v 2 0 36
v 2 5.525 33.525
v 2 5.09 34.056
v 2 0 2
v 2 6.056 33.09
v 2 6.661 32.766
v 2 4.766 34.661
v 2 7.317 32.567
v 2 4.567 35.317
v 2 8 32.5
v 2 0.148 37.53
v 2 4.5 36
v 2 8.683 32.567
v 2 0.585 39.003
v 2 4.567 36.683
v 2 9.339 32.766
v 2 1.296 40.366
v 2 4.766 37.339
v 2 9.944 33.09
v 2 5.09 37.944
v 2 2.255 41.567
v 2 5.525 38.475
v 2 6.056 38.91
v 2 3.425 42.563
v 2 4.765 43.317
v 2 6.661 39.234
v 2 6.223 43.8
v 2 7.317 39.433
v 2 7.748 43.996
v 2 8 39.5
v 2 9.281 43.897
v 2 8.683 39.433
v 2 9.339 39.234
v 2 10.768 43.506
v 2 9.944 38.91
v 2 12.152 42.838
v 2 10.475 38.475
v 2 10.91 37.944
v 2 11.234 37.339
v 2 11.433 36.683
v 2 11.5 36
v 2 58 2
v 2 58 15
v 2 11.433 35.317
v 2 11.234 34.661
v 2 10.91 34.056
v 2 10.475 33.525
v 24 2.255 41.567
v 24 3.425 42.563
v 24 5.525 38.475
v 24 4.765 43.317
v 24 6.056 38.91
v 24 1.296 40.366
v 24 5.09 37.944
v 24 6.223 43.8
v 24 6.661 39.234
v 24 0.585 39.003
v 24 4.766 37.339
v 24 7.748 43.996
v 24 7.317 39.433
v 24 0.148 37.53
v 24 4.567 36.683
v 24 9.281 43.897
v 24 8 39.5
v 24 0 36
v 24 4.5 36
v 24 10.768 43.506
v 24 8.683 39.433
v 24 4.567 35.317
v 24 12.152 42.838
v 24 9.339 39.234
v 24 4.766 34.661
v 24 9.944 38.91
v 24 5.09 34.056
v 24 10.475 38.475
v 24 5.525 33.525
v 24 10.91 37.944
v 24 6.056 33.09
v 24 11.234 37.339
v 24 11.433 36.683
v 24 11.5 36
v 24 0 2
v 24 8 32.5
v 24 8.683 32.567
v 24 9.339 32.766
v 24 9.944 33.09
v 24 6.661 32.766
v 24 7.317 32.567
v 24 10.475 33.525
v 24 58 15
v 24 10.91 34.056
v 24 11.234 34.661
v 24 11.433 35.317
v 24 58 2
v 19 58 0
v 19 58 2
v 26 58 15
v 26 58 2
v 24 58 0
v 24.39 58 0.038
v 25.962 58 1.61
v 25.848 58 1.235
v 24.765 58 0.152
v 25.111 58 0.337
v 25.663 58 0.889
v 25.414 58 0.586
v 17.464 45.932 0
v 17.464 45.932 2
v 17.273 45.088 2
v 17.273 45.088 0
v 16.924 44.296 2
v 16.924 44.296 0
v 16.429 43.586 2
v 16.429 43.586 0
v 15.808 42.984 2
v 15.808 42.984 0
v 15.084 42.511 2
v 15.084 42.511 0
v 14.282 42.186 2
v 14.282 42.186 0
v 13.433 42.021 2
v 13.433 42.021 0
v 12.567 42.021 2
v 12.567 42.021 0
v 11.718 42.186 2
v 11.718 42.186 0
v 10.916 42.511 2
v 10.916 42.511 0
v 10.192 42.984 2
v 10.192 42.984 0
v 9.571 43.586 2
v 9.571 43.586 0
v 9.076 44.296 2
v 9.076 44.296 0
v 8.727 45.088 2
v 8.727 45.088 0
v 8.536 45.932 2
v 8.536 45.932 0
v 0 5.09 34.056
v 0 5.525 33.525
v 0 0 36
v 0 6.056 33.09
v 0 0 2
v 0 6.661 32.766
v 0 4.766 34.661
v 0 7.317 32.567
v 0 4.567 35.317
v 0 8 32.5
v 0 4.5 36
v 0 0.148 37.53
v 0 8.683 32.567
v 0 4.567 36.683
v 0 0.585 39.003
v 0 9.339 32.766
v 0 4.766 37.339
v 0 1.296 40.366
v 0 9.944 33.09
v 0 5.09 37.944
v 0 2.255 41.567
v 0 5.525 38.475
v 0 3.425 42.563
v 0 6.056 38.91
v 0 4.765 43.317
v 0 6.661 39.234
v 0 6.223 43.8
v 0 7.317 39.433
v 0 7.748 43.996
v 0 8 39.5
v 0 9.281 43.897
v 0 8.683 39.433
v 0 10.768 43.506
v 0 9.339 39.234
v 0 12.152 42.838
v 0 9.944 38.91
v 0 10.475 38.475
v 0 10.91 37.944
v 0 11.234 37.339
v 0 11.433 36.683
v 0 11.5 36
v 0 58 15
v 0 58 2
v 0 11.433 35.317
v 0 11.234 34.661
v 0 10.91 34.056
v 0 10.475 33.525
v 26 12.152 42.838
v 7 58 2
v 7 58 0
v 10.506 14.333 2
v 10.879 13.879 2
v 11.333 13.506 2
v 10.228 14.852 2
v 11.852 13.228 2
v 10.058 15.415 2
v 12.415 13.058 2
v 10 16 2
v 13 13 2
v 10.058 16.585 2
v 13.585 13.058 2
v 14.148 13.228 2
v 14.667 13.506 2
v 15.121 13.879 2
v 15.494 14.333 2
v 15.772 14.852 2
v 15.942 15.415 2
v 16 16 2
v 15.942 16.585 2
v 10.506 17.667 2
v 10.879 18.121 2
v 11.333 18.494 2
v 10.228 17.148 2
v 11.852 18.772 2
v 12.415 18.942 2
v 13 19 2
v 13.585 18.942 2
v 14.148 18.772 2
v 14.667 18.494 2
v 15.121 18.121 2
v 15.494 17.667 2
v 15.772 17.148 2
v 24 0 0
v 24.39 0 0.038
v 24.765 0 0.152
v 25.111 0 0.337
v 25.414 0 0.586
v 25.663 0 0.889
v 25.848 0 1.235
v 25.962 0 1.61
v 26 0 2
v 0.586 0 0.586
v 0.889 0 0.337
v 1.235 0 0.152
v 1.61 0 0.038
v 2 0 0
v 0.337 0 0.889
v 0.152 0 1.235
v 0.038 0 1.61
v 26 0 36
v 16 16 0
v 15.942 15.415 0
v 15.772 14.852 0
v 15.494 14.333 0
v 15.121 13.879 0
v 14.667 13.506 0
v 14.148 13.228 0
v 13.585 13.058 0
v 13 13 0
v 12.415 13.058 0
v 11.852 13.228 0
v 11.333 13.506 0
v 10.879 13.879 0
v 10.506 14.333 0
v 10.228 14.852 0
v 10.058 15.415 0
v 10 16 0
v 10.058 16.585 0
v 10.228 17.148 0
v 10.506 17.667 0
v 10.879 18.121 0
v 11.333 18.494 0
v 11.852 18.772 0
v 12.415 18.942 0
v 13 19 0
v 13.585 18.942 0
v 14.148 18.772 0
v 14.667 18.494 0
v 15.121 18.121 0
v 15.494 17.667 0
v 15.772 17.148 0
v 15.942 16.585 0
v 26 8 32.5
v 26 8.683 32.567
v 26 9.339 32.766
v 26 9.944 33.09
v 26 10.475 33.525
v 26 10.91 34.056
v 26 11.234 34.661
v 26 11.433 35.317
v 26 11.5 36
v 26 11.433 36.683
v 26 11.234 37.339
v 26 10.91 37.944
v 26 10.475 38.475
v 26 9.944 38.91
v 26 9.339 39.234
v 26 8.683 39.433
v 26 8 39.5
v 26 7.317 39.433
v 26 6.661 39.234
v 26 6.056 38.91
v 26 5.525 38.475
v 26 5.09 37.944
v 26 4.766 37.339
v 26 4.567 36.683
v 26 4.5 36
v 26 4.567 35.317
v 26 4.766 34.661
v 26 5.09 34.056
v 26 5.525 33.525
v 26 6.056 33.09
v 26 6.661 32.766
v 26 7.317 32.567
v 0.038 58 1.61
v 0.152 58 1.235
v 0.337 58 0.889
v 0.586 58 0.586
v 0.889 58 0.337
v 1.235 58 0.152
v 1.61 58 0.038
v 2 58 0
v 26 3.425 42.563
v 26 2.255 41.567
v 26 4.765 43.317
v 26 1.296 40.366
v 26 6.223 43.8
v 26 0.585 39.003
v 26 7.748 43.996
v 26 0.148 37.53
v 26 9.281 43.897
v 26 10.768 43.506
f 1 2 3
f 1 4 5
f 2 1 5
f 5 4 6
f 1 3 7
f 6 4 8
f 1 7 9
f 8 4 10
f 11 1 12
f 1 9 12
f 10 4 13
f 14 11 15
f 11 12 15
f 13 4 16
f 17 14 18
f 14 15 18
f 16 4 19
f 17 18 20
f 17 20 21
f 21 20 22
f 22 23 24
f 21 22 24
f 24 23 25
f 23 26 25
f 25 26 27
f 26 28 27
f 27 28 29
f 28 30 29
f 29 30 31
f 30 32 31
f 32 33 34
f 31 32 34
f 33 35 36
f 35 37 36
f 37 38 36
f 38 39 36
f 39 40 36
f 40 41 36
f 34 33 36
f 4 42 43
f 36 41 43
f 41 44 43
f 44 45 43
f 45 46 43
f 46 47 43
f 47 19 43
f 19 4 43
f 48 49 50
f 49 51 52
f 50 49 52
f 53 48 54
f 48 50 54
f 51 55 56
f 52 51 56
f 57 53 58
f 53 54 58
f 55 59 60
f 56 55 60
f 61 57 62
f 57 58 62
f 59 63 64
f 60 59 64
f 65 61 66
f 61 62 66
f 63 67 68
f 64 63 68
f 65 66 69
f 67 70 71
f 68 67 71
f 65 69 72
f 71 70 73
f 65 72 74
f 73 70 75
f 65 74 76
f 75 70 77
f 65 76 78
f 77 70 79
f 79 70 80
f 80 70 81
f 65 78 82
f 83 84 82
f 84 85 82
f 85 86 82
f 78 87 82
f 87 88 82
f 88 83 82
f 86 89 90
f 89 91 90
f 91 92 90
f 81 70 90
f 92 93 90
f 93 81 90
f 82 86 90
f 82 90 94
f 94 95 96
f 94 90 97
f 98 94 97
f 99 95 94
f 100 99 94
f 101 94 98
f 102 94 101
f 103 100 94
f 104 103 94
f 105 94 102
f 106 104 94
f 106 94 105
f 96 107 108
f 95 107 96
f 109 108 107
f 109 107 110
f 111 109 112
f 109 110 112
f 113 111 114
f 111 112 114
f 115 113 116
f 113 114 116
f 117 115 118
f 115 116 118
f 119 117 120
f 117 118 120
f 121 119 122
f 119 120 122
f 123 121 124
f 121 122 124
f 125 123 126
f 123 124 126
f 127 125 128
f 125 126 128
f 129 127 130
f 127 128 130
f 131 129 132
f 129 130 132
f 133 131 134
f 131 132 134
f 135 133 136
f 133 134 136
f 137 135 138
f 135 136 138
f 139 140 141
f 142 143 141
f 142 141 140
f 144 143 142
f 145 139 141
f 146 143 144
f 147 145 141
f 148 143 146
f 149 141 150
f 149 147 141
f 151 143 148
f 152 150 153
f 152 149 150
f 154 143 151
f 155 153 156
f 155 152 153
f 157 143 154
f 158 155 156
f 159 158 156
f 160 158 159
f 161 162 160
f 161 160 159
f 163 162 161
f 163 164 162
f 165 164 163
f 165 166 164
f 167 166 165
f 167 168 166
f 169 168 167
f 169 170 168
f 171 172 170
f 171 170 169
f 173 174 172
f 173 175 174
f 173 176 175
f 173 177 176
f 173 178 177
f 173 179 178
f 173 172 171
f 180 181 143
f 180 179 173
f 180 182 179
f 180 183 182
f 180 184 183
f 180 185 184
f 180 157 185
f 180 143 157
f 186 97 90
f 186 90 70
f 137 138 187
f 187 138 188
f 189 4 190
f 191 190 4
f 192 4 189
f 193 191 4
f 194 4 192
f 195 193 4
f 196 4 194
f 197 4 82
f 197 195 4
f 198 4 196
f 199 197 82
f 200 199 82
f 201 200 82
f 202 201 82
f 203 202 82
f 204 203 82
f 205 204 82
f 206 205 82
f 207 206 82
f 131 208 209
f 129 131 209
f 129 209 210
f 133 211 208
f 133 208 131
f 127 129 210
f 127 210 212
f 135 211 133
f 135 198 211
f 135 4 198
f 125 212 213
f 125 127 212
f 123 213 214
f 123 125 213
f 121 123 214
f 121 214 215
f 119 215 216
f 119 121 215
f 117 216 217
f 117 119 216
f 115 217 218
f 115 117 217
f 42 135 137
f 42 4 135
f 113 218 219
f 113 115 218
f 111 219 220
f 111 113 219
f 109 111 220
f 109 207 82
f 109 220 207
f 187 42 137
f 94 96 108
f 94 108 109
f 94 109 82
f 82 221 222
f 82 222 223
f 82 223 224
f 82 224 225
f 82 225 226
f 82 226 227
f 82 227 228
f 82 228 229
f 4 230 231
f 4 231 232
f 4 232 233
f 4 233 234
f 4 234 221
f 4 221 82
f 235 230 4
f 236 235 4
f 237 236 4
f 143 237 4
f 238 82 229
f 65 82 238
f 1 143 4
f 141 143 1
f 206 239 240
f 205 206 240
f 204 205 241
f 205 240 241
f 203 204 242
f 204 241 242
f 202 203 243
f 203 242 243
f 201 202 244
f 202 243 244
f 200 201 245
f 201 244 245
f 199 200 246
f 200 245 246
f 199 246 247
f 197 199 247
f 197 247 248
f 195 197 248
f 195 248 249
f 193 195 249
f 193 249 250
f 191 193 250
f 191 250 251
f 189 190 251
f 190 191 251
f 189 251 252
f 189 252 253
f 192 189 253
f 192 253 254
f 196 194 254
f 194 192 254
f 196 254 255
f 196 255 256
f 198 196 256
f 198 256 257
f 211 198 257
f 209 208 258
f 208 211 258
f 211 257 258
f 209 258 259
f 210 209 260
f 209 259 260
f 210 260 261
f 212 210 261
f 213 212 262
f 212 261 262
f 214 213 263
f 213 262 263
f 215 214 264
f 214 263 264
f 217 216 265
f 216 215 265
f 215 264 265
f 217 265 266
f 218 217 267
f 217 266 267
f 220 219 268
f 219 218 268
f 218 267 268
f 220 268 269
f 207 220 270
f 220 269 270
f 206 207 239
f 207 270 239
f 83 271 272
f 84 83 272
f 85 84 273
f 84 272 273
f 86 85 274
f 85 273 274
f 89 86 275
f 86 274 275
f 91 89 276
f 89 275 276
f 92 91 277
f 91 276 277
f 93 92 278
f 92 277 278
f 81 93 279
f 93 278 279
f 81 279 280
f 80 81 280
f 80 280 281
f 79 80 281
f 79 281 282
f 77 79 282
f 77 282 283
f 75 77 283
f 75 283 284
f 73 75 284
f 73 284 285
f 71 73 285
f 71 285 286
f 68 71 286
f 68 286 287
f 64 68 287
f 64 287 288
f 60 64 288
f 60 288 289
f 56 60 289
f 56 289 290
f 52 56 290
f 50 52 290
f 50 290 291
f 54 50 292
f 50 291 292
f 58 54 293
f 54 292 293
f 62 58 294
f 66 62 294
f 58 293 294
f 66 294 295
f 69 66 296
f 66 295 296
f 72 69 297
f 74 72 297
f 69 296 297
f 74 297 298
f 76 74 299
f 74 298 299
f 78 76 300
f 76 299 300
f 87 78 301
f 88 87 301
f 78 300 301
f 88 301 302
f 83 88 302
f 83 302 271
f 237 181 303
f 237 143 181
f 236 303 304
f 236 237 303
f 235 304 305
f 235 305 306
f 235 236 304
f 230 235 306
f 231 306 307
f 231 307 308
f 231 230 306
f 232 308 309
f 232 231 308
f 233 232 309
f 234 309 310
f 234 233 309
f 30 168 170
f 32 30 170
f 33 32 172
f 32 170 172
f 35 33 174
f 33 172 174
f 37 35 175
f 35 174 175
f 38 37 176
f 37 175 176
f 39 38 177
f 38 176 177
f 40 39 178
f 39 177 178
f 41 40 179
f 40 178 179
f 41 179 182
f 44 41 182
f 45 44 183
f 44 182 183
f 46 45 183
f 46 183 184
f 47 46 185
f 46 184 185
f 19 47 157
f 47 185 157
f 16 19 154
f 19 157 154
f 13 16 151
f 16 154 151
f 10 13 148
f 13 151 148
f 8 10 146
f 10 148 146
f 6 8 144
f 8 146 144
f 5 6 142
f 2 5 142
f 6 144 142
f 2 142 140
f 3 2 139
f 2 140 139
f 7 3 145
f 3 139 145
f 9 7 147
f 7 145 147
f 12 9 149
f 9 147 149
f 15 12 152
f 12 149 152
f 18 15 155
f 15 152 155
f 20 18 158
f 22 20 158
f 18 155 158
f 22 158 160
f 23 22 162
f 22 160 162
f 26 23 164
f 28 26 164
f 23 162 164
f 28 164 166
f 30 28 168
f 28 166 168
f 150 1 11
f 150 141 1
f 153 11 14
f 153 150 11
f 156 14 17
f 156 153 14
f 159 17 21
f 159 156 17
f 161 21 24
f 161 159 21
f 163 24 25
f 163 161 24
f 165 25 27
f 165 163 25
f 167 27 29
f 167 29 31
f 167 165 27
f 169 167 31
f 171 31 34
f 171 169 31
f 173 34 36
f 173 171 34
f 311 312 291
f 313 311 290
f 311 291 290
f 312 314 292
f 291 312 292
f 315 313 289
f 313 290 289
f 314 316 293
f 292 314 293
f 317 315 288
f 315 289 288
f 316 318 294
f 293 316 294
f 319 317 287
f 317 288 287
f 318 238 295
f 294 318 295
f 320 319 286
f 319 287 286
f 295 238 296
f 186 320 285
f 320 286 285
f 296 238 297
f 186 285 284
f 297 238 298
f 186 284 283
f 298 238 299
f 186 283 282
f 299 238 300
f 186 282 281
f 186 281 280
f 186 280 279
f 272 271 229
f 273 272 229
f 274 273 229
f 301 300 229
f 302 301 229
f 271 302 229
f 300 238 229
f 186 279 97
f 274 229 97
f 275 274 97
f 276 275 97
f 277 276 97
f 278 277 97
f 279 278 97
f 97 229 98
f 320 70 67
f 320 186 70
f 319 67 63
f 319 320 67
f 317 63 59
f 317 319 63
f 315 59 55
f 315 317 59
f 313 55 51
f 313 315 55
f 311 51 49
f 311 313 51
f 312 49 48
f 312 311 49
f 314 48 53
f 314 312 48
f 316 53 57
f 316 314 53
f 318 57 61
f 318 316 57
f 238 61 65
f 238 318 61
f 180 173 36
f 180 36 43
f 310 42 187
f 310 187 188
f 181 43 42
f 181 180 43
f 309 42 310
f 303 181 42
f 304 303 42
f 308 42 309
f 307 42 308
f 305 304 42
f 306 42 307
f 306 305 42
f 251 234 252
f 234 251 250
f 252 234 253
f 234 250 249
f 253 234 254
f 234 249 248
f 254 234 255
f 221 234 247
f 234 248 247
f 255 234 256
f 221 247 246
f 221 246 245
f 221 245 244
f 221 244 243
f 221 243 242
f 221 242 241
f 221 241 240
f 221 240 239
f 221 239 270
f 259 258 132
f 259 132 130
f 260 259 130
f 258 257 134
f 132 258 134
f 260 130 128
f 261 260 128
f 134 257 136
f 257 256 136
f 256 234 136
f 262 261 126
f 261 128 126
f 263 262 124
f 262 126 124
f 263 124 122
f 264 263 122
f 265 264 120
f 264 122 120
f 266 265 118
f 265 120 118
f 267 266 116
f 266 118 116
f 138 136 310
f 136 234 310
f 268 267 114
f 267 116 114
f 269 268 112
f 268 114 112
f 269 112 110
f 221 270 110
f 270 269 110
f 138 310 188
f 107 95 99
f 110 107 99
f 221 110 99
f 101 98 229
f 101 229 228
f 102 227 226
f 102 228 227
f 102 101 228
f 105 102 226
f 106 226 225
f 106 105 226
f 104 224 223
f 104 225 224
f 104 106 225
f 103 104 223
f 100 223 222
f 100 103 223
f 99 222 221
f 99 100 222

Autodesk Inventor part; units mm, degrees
ref_plane "YZ Plane" through (0, 0, 0) normal (1, 0, 0) x (0, 1, 0)
ref_plane "XZ Plane" through (0, 0, 0) normal (0, 1, 0) x (-1, 0, 0)
ref_plane "XY Plane" through (0, 0, 0) normal (0, 0, 1) x (1, 0, 0)
sketch "Sketch1" plane through (0, 0, 0) normal (0, 0, 1) x (1, 0, 0)
  line L0 (0, 0) -> (26, 0)
  line L1 (26, 0) -> (26, 58)
  line L2 (26, 58) -> (0, 58) construction
  line L3 (0, 58) -> (0, 0)
  circle A0 centre (13, 16) radius 3
  line L4 (0, 58) -> (7, 58)
  line L5 (19, 58) -> (26, 58)
  line L6 (17.464, 45.9318) -> (19, 58)
  line L7 (8.536, 45.9318) -> (7, 58)
  line L8 (13, 58) -> (13, 46.5) construction
  circle A1 centre (13, 46.5) radius 4.5 construction
  arc A2 (8.536, 45.9318) -> (17.464, 45.9318) centre (13, 46.5) ccw
  point P0 (13, 0)
  dimension "d0" = 26
  dimension "d1" = 58
  dimension "d2" = 6
  dimension "d3" = 16
  dimension "d19" = 12
  dimension "d20" = 9
  dimension "d21" = 11.5
extrude "Extrusion1" add sketch "Sketch1" along normal blind 2
sketch "Sketch2" plane through (26, 0, 0) normal (1, 0, 0) x (0, 0, -1)
  circle A0 centre (-36, 8) radius 3.5
  line L0 (0, 0) -> (0, 58) projected
  line L1 (0, 0) -> (-36, 0)
  circle A1 centre (-36, 8) radius 8 construction
  line L2 (0, 58) -> (-15, 58)
  line L3 (-15, 58) -> (-42.8382, 12.152)
  arc A2 (-42.8382, 12.152) -> (-36, 0) centre (-36, 8) ccw
  dimension "d13" = 16
  dimension "d8" = 7
  dimension "d10" = 8
  dimension "d11" = 36
  dimension "d14" = 15
extrude "Extrusion2" add sketch "Sketch2" against normal blind 2
sketch "Sketch3" plane through (0, 0, 0) normal (-1, 0, 0) x (0, 0, 1)
  line L0 (2, 0) -> (2, 58) projected
  line L1 (2, 0) -> (36, 0) projected
  arc A0 (36, 0) -> (42.8382, 12.152) centre (36, 8) ccw projected
  line L2 (42.8382, 12.152) -> (15, 58) projected
  line L3 (15, 58) -> (2, 58) projected
  circle A1 centre (36, 8) radius 3.5 projected
  point P0 (0, 0)
extrude "Extrusion3" add sketch "Sketch3" against normal blind 2
fillet "Fillet1" radius 2 2 edges at (0, 29, 0) (26, 29, 0)
properties part number "Mount" material "Stainless Steel"
